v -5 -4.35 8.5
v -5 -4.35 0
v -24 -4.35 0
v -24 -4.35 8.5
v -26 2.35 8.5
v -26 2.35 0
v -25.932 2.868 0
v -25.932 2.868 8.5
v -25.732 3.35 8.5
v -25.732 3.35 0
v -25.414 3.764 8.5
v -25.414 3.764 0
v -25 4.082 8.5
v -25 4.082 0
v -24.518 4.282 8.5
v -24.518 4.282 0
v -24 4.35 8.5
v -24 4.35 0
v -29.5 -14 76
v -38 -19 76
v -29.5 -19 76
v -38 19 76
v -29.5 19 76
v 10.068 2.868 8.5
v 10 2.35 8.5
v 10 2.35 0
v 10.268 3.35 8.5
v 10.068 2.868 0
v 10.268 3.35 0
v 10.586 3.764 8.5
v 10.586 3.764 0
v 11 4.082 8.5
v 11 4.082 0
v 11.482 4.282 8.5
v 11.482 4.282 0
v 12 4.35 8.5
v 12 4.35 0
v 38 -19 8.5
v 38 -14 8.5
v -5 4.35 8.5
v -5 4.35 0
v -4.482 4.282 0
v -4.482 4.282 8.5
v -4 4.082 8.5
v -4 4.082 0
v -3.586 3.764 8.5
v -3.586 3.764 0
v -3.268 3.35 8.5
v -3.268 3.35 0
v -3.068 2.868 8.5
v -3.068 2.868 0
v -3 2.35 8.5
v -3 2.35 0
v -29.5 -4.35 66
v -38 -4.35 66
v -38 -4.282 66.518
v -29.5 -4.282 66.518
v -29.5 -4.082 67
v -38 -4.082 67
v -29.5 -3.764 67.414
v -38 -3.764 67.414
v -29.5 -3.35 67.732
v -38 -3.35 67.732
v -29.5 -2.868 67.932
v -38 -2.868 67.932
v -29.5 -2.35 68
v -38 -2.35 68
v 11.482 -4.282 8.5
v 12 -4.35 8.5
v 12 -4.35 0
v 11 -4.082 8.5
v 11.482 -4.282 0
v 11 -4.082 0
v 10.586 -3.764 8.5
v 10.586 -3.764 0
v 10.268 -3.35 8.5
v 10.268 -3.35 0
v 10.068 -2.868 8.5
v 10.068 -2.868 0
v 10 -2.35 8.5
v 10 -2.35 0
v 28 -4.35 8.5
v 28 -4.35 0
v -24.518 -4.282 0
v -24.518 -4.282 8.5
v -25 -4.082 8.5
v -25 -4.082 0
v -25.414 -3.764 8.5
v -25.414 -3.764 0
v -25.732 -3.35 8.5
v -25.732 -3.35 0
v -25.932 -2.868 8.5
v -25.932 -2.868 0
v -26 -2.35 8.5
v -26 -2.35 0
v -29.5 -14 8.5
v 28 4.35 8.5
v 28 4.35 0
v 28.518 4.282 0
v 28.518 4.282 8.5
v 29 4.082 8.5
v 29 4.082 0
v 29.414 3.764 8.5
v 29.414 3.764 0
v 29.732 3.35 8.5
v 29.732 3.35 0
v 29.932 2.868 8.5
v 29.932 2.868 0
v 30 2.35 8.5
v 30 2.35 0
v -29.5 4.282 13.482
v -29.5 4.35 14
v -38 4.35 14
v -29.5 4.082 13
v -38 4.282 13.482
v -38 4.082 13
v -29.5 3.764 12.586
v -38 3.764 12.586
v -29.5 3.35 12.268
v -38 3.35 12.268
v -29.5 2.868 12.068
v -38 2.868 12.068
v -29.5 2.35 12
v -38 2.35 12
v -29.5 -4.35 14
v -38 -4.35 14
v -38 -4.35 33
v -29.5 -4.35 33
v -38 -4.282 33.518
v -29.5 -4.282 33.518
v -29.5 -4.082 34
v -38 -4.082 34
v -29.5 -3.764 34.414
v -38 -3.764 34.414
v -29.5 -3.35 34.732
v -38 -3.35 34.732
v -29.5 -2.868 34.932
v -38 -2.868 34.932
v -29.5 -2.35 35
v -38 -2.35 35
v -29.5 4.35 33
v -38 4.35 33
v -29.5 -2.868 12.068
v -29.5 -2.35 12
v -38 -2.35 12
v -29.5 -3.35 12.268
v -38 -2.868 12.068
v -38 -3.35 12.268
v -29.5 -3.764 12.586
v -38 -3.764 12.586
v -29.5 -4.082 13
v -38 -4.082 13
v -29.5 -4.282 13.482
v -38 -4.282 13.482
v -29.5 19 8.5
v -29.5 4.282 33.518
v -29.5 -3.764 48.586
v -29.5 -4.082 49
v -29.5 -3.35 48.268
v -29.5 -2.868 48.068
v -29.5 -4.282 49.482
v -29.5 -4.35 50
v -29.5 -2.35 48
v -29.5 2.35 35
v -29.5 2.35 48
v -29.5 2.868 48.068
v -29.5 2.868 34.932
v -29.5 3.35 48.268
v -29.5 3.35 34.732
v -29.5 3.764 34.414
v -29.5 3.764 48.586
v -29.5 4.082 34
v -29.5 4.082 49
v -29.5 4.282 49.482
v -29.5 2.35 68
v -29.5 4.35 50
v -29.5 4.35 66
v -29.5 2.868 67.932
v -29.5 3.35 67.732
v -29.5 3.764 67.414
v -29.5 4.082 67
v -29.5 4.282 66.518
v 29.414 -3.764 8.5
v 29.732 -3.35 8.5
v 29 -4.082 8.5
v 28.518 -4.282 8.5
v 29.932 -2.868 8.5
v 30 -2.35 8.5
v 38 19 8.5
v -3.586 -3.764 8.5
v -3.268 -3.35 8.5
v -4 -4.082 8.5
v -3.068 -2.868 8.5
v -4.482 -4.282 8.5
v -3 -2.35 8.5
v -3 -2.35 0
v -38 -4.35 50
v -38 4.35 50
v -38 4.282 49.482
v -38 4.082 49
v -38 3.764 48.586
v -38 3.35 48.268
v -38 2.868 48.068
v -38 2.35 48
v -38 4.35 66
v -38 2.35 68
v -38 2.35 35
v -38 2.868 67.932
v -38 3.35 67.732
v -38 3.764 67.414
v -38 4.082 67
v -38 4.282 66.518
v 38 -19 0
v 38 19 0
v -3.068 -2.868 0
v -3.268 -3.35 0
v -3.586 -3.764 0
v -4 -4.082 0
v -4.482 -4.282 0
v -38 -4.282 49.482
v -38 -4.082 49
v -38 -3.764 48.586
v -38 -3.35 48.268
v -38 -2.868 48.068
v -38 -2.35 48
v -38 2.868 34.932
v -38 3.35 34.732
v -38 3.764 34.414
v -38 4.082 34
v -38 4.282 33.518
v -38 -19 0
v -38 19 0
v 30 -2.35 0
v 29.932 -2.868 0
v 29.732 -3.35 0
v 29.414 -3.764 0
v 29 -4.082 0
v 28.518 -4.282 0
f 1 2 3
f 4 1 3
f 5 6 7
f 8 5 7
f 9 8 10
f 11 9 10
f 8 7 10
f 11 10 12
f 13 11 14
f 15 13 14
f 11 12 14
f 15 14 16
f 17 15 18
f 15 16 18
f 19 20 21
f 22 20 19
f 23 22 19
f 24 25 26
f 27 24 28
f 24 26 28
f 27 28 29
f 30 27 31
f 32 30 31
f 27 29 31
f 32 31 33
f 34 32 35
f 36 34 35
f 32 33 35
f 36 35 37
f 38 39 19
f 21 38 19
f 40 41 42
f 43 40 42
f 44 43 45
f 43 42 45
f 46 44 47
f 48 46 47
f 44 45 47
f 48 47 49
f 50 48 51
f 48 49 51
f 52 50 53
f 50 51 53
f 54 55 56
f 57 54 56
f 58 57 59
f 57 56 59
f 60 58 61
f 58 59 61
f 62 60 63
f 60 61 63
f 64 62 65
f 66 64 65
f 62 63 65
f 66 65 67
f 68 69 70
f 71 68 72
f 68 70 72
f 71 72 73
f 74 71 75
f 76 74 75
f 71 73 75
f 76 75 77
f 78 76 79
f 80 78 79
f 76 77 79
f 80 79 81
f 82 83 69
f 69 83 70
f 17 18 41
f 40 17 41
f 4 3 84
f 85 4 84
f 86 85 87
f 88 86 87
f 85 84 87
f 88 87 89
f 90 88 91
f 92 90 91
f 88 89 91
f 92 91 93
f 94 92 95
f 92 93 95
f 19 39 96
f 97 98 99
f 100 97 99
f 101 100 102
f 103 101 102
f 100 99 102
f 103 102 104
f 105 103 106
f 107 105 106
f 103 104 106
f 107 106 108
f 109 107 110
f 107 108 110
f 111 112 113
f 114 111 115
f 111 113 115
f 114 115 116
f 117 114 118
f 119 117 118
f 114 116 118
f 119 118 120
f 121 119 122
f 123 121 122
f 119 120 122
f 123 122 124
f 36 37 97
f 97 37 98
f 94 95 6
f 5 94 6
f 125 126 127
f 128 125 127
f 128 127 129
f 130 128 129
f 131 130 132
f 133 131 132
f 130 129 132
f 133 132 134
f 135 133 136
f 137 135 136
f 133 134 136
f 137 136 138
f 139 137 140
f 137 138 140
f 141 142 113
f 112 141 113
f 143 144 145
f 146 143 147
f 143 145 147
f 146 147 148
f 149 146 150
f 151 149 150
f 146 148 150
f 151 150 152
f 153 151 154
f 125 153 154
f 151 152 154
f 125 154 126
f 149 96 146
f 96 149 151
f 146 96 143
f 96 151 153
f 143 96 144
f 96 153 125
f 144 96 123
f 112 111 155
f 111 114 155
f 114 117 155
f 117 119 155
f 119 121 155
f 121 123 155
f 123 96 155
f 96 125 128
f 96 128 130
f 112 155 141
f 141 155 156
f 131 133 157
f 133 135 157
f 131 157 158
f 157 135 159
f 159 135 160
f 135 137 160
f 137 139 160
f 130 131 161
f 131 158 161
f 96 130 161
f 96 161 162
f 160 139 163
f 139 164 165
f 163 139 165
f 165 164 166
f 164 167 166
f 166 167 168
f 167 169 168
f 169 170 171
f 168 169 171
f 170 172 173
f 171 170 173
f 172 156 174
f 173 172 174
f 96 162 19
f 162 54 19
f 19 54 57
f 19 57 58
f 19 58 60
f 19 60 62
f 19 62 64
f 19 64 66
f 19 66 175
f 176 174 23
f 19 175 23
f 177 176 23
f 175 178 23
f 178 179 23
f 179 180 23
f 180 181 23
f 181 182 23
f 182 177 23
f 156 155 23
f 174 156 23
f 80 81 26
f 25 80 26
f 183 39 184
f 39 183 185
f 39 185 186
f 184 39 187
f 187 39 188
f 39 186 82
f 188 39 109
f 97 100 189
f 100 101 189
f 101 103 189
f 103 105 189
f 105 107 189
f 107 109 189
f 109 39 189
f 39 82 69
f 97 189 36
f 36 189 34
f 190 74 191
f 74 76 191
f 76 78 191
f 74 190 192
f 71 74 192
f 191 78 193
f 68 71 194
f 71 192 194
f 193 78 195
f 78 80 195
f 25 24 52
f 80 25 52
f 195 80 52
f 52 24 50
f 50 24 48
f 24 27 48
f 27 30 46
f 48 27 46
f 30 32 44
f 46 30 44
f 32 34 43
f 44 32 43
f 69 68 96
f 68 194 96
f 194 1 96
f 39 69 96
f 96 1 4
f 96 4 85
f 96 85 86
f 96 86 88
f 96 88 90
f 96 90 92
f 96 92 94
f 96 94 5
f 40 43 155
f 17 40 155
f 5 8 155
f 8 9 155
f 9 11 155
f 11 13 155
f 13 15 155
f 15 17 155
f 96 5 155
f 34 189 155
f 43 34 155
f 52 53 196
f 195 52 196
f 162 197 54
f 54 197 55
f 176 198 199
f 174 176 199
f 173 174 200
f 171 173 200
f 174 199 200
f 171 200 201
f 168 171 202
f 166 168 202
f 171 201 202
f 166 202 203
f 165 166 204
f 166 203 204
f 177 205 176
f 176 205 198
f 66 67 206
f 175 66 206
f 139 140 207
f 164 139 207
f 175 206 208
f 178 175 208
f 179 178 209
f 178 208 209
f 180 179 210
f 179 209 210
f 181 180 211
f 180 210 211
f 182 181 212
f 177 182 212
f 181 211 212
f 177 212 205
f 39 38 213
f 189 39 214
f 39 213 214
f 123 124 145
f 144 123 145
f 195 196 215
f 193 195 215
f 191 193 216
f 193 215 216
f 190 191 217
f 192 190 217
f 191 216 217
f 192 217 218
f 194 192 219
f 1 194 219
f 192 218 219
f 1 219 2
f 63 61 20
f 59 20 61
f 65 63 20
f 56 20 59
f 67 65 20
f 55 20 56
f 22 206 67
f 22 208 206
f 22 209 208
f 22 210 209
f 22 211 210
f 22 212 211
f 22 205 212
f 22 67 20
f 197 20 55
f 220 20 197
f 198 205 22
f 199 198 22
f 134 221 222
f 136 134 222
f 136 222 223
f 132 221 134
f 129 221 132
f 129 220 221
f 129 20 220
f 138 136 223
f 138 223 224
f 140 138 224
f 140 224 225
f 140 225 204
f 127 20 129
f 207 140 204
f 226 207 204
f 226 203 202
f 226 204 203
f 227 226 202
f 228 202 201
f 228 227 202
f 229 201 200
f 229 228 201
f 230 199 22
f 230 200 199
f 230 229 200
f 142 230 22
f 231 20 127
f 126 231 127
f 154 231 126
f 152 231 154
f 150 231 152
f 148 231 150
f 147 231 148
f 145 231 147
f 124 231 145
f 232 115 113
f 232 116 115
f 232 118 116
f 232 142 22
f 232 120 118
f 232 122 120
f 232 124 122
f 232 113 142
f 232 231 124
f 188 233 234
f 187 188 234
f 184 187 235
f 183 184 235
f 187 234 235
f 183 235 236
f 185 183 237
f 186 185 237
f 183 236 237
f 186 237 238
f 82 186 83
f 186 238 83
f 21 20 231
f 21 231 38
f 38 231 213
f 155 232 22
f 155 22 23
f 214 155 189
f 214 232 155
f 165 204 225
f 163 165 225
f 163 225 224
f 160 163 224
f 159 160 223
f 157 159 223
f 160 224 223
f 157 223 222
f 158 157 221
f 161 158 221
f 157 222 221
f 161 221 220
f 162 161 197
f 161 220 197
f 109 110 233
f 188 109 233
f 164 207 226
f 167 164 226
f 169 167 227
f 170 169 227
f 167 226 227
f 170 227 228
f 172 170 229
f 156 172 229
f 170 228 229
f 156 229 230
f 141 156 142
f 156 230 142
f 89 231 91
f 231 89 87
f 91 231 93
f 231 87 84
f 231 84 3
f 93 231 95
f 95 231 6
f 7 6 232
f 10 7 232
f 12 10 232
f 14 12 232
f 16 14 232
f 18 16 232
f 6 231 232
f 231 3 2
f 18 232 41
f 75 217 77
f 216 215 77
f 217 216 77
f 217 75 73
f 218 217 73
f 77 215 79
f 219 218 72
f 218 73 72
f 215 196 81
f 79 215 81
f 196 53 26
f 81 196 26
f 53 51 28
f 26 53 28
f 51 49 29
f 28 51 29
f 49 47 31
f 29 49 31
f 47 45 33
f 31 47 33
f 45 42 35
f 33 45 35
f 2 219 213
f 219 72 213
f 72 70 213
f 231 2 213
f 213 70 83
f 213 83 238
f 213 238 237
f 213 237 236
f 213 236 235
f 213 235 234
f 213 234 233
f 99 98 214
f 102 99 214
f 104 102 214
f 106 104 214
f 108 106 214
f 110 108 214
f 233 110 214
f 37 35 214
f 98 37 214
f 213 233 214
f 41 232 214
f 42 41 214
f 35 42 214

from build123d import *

# Parameters (mm, degrees)
F0_W     = 76
F0_H     = 38
F1_DEPTH = 76
F3_DEPTH = 38.001
F4_DEPTH = 33
F6_DEPTH = 76.001
F8_DEPTH = 76.001


with BuildPart() as f1:
    # F0 (on Top) → F1 (new body)
    with BuildSketch(Plane.XY):
        Rectangle(F0_W, F0_H)
    extrude(amount=F1_DEPTH)

    # F2 (on face) → F3 (cut, through all)
    with BuildSketch(Plane(origin=(0, 19, 0), x_dir=(-1, 0, 0), z_dir=(0, 1, 0))):
        Polygon((-38, 8.5), (29.5, 76), (-38, 76), align=None)
    extrude(amount=-F3_DEPTH, mode=Mode.SUBTRACT)

    # F2 (on face) → F4 (cut)
    with BuildSketch(Plane(origin=(0, 19, 0), x_dir=(-1, 0, 0), z_dir=(0, 1, 0))):
        Polygon((29.5, 8.5), (29.5, 76), (-38, 8.5), align=None)
    extrude(amount=-F4_DEPTH, mode=Mode.SUBTRACT)

    # F5 (on face) → F6 (cut, through all)
    with BuildSketch(Plane(origin=(-38, 0, 0), x_dir=(0, -1, 0), z_dir=(-1, 0, 0))):
        with BuildLine():
            Line((2.35, 68), (-2.35, 68))
            ThreePointArc((-2.35, 68), (-3.764214, 67.414214), (-4.35, 66))
            Line((-4.35, 66), (-4.35, 50))
            ThreePointArc((-4.35, 50), (-3.764214, 48.585786), (-2.35, 48))
            Line((-2.35, 48), (2.35, 48))
            ThreePointArc((2.35, 48), (3.764214, 48.585786), (4.35, 50))
            Line((4.35, 50), (4.35, 66))
            ThreePointArc((4.35, 66), (3.764214, 67.414214), (2.35, 68))
        make_face()
        with BuildLine():
            Line((2.35, 35), (-2.35, 35))
            ThreePointArc((-2.35, 35), (-3.764214, 34.414214), (-4.35, 33))
            Line((-4.35, 33), (-4.35, 14))
            ThreePointArc((-4.35, 14), (-3.764214, 12.585786), (-2.35, 12))
            Line((-2.35, 12), (2.35, 12))
            ThreePointArc((2.35, 12), (3.764214, 12.585786), (4.35, 14))
            Line((4.35, 14), (4.35, 33))
            ThreePointArc((4.35, 33), (3.764214, 34.414214), (2.35, 35))
        make_face()
    extrude(amount=-F6_DEPTH, mode=Mode.SUBTRACT)

    # F7 (on face) → F8 (cut, through all)
    with BuildSketch(Plane(origin=(0, 0, 0), x_dir=(1, 0, 0), z_dir=(0, 0, -1))):
        with BuildLine():
            Line((-3, -2.35), (-3, 2.35))
            ThreePointArc((-3, 2.35), (-3.585786, 3.764214), (-5, 4.35))
            Line((-5, 4.35), (-24, 4.35))
            ThreePointArc((-24, 4.35), (-25.414214, 3.764214), (-26, 2.35))
            Line((-26, 2.35), (-26, -2.35))
            ThreePointArc((-26, -2.35), (-25.414214, -3.764214), (-24, -4.35))
            Line((-24, -4.35), (-5, -4.35))
            ThreePointArc((-5, -4.35), (-3.585786, -3.764214), (-3, -2.35))
        make_face()
        with BuildLine():
            Line((30, -2.35), (30, 2.35))
            ThreePointArc((30, 2.35), (29.414214, 3.764214), (28, 4.35))
            Line((28, 4.35), (12, 4.35))
            ThreePointArc((12, 4.35), (10.585786, 3.764214), (10, 2.35))
            Line((10, 2.35), (10, -2.35))
            ThreePointArc((10, -2.35), (10.585786, -3.764214), (12, -4.35))
            Line((12, -4.35), (28, -4.35))
            ThreePointArc((28, -4.35), (29.414214, -3.764214), (30, -2.35))
        make_face()
    extrude(amount=-F8_DEPTH, mode=Mode.SUBTRACT)


solid = f1.part
